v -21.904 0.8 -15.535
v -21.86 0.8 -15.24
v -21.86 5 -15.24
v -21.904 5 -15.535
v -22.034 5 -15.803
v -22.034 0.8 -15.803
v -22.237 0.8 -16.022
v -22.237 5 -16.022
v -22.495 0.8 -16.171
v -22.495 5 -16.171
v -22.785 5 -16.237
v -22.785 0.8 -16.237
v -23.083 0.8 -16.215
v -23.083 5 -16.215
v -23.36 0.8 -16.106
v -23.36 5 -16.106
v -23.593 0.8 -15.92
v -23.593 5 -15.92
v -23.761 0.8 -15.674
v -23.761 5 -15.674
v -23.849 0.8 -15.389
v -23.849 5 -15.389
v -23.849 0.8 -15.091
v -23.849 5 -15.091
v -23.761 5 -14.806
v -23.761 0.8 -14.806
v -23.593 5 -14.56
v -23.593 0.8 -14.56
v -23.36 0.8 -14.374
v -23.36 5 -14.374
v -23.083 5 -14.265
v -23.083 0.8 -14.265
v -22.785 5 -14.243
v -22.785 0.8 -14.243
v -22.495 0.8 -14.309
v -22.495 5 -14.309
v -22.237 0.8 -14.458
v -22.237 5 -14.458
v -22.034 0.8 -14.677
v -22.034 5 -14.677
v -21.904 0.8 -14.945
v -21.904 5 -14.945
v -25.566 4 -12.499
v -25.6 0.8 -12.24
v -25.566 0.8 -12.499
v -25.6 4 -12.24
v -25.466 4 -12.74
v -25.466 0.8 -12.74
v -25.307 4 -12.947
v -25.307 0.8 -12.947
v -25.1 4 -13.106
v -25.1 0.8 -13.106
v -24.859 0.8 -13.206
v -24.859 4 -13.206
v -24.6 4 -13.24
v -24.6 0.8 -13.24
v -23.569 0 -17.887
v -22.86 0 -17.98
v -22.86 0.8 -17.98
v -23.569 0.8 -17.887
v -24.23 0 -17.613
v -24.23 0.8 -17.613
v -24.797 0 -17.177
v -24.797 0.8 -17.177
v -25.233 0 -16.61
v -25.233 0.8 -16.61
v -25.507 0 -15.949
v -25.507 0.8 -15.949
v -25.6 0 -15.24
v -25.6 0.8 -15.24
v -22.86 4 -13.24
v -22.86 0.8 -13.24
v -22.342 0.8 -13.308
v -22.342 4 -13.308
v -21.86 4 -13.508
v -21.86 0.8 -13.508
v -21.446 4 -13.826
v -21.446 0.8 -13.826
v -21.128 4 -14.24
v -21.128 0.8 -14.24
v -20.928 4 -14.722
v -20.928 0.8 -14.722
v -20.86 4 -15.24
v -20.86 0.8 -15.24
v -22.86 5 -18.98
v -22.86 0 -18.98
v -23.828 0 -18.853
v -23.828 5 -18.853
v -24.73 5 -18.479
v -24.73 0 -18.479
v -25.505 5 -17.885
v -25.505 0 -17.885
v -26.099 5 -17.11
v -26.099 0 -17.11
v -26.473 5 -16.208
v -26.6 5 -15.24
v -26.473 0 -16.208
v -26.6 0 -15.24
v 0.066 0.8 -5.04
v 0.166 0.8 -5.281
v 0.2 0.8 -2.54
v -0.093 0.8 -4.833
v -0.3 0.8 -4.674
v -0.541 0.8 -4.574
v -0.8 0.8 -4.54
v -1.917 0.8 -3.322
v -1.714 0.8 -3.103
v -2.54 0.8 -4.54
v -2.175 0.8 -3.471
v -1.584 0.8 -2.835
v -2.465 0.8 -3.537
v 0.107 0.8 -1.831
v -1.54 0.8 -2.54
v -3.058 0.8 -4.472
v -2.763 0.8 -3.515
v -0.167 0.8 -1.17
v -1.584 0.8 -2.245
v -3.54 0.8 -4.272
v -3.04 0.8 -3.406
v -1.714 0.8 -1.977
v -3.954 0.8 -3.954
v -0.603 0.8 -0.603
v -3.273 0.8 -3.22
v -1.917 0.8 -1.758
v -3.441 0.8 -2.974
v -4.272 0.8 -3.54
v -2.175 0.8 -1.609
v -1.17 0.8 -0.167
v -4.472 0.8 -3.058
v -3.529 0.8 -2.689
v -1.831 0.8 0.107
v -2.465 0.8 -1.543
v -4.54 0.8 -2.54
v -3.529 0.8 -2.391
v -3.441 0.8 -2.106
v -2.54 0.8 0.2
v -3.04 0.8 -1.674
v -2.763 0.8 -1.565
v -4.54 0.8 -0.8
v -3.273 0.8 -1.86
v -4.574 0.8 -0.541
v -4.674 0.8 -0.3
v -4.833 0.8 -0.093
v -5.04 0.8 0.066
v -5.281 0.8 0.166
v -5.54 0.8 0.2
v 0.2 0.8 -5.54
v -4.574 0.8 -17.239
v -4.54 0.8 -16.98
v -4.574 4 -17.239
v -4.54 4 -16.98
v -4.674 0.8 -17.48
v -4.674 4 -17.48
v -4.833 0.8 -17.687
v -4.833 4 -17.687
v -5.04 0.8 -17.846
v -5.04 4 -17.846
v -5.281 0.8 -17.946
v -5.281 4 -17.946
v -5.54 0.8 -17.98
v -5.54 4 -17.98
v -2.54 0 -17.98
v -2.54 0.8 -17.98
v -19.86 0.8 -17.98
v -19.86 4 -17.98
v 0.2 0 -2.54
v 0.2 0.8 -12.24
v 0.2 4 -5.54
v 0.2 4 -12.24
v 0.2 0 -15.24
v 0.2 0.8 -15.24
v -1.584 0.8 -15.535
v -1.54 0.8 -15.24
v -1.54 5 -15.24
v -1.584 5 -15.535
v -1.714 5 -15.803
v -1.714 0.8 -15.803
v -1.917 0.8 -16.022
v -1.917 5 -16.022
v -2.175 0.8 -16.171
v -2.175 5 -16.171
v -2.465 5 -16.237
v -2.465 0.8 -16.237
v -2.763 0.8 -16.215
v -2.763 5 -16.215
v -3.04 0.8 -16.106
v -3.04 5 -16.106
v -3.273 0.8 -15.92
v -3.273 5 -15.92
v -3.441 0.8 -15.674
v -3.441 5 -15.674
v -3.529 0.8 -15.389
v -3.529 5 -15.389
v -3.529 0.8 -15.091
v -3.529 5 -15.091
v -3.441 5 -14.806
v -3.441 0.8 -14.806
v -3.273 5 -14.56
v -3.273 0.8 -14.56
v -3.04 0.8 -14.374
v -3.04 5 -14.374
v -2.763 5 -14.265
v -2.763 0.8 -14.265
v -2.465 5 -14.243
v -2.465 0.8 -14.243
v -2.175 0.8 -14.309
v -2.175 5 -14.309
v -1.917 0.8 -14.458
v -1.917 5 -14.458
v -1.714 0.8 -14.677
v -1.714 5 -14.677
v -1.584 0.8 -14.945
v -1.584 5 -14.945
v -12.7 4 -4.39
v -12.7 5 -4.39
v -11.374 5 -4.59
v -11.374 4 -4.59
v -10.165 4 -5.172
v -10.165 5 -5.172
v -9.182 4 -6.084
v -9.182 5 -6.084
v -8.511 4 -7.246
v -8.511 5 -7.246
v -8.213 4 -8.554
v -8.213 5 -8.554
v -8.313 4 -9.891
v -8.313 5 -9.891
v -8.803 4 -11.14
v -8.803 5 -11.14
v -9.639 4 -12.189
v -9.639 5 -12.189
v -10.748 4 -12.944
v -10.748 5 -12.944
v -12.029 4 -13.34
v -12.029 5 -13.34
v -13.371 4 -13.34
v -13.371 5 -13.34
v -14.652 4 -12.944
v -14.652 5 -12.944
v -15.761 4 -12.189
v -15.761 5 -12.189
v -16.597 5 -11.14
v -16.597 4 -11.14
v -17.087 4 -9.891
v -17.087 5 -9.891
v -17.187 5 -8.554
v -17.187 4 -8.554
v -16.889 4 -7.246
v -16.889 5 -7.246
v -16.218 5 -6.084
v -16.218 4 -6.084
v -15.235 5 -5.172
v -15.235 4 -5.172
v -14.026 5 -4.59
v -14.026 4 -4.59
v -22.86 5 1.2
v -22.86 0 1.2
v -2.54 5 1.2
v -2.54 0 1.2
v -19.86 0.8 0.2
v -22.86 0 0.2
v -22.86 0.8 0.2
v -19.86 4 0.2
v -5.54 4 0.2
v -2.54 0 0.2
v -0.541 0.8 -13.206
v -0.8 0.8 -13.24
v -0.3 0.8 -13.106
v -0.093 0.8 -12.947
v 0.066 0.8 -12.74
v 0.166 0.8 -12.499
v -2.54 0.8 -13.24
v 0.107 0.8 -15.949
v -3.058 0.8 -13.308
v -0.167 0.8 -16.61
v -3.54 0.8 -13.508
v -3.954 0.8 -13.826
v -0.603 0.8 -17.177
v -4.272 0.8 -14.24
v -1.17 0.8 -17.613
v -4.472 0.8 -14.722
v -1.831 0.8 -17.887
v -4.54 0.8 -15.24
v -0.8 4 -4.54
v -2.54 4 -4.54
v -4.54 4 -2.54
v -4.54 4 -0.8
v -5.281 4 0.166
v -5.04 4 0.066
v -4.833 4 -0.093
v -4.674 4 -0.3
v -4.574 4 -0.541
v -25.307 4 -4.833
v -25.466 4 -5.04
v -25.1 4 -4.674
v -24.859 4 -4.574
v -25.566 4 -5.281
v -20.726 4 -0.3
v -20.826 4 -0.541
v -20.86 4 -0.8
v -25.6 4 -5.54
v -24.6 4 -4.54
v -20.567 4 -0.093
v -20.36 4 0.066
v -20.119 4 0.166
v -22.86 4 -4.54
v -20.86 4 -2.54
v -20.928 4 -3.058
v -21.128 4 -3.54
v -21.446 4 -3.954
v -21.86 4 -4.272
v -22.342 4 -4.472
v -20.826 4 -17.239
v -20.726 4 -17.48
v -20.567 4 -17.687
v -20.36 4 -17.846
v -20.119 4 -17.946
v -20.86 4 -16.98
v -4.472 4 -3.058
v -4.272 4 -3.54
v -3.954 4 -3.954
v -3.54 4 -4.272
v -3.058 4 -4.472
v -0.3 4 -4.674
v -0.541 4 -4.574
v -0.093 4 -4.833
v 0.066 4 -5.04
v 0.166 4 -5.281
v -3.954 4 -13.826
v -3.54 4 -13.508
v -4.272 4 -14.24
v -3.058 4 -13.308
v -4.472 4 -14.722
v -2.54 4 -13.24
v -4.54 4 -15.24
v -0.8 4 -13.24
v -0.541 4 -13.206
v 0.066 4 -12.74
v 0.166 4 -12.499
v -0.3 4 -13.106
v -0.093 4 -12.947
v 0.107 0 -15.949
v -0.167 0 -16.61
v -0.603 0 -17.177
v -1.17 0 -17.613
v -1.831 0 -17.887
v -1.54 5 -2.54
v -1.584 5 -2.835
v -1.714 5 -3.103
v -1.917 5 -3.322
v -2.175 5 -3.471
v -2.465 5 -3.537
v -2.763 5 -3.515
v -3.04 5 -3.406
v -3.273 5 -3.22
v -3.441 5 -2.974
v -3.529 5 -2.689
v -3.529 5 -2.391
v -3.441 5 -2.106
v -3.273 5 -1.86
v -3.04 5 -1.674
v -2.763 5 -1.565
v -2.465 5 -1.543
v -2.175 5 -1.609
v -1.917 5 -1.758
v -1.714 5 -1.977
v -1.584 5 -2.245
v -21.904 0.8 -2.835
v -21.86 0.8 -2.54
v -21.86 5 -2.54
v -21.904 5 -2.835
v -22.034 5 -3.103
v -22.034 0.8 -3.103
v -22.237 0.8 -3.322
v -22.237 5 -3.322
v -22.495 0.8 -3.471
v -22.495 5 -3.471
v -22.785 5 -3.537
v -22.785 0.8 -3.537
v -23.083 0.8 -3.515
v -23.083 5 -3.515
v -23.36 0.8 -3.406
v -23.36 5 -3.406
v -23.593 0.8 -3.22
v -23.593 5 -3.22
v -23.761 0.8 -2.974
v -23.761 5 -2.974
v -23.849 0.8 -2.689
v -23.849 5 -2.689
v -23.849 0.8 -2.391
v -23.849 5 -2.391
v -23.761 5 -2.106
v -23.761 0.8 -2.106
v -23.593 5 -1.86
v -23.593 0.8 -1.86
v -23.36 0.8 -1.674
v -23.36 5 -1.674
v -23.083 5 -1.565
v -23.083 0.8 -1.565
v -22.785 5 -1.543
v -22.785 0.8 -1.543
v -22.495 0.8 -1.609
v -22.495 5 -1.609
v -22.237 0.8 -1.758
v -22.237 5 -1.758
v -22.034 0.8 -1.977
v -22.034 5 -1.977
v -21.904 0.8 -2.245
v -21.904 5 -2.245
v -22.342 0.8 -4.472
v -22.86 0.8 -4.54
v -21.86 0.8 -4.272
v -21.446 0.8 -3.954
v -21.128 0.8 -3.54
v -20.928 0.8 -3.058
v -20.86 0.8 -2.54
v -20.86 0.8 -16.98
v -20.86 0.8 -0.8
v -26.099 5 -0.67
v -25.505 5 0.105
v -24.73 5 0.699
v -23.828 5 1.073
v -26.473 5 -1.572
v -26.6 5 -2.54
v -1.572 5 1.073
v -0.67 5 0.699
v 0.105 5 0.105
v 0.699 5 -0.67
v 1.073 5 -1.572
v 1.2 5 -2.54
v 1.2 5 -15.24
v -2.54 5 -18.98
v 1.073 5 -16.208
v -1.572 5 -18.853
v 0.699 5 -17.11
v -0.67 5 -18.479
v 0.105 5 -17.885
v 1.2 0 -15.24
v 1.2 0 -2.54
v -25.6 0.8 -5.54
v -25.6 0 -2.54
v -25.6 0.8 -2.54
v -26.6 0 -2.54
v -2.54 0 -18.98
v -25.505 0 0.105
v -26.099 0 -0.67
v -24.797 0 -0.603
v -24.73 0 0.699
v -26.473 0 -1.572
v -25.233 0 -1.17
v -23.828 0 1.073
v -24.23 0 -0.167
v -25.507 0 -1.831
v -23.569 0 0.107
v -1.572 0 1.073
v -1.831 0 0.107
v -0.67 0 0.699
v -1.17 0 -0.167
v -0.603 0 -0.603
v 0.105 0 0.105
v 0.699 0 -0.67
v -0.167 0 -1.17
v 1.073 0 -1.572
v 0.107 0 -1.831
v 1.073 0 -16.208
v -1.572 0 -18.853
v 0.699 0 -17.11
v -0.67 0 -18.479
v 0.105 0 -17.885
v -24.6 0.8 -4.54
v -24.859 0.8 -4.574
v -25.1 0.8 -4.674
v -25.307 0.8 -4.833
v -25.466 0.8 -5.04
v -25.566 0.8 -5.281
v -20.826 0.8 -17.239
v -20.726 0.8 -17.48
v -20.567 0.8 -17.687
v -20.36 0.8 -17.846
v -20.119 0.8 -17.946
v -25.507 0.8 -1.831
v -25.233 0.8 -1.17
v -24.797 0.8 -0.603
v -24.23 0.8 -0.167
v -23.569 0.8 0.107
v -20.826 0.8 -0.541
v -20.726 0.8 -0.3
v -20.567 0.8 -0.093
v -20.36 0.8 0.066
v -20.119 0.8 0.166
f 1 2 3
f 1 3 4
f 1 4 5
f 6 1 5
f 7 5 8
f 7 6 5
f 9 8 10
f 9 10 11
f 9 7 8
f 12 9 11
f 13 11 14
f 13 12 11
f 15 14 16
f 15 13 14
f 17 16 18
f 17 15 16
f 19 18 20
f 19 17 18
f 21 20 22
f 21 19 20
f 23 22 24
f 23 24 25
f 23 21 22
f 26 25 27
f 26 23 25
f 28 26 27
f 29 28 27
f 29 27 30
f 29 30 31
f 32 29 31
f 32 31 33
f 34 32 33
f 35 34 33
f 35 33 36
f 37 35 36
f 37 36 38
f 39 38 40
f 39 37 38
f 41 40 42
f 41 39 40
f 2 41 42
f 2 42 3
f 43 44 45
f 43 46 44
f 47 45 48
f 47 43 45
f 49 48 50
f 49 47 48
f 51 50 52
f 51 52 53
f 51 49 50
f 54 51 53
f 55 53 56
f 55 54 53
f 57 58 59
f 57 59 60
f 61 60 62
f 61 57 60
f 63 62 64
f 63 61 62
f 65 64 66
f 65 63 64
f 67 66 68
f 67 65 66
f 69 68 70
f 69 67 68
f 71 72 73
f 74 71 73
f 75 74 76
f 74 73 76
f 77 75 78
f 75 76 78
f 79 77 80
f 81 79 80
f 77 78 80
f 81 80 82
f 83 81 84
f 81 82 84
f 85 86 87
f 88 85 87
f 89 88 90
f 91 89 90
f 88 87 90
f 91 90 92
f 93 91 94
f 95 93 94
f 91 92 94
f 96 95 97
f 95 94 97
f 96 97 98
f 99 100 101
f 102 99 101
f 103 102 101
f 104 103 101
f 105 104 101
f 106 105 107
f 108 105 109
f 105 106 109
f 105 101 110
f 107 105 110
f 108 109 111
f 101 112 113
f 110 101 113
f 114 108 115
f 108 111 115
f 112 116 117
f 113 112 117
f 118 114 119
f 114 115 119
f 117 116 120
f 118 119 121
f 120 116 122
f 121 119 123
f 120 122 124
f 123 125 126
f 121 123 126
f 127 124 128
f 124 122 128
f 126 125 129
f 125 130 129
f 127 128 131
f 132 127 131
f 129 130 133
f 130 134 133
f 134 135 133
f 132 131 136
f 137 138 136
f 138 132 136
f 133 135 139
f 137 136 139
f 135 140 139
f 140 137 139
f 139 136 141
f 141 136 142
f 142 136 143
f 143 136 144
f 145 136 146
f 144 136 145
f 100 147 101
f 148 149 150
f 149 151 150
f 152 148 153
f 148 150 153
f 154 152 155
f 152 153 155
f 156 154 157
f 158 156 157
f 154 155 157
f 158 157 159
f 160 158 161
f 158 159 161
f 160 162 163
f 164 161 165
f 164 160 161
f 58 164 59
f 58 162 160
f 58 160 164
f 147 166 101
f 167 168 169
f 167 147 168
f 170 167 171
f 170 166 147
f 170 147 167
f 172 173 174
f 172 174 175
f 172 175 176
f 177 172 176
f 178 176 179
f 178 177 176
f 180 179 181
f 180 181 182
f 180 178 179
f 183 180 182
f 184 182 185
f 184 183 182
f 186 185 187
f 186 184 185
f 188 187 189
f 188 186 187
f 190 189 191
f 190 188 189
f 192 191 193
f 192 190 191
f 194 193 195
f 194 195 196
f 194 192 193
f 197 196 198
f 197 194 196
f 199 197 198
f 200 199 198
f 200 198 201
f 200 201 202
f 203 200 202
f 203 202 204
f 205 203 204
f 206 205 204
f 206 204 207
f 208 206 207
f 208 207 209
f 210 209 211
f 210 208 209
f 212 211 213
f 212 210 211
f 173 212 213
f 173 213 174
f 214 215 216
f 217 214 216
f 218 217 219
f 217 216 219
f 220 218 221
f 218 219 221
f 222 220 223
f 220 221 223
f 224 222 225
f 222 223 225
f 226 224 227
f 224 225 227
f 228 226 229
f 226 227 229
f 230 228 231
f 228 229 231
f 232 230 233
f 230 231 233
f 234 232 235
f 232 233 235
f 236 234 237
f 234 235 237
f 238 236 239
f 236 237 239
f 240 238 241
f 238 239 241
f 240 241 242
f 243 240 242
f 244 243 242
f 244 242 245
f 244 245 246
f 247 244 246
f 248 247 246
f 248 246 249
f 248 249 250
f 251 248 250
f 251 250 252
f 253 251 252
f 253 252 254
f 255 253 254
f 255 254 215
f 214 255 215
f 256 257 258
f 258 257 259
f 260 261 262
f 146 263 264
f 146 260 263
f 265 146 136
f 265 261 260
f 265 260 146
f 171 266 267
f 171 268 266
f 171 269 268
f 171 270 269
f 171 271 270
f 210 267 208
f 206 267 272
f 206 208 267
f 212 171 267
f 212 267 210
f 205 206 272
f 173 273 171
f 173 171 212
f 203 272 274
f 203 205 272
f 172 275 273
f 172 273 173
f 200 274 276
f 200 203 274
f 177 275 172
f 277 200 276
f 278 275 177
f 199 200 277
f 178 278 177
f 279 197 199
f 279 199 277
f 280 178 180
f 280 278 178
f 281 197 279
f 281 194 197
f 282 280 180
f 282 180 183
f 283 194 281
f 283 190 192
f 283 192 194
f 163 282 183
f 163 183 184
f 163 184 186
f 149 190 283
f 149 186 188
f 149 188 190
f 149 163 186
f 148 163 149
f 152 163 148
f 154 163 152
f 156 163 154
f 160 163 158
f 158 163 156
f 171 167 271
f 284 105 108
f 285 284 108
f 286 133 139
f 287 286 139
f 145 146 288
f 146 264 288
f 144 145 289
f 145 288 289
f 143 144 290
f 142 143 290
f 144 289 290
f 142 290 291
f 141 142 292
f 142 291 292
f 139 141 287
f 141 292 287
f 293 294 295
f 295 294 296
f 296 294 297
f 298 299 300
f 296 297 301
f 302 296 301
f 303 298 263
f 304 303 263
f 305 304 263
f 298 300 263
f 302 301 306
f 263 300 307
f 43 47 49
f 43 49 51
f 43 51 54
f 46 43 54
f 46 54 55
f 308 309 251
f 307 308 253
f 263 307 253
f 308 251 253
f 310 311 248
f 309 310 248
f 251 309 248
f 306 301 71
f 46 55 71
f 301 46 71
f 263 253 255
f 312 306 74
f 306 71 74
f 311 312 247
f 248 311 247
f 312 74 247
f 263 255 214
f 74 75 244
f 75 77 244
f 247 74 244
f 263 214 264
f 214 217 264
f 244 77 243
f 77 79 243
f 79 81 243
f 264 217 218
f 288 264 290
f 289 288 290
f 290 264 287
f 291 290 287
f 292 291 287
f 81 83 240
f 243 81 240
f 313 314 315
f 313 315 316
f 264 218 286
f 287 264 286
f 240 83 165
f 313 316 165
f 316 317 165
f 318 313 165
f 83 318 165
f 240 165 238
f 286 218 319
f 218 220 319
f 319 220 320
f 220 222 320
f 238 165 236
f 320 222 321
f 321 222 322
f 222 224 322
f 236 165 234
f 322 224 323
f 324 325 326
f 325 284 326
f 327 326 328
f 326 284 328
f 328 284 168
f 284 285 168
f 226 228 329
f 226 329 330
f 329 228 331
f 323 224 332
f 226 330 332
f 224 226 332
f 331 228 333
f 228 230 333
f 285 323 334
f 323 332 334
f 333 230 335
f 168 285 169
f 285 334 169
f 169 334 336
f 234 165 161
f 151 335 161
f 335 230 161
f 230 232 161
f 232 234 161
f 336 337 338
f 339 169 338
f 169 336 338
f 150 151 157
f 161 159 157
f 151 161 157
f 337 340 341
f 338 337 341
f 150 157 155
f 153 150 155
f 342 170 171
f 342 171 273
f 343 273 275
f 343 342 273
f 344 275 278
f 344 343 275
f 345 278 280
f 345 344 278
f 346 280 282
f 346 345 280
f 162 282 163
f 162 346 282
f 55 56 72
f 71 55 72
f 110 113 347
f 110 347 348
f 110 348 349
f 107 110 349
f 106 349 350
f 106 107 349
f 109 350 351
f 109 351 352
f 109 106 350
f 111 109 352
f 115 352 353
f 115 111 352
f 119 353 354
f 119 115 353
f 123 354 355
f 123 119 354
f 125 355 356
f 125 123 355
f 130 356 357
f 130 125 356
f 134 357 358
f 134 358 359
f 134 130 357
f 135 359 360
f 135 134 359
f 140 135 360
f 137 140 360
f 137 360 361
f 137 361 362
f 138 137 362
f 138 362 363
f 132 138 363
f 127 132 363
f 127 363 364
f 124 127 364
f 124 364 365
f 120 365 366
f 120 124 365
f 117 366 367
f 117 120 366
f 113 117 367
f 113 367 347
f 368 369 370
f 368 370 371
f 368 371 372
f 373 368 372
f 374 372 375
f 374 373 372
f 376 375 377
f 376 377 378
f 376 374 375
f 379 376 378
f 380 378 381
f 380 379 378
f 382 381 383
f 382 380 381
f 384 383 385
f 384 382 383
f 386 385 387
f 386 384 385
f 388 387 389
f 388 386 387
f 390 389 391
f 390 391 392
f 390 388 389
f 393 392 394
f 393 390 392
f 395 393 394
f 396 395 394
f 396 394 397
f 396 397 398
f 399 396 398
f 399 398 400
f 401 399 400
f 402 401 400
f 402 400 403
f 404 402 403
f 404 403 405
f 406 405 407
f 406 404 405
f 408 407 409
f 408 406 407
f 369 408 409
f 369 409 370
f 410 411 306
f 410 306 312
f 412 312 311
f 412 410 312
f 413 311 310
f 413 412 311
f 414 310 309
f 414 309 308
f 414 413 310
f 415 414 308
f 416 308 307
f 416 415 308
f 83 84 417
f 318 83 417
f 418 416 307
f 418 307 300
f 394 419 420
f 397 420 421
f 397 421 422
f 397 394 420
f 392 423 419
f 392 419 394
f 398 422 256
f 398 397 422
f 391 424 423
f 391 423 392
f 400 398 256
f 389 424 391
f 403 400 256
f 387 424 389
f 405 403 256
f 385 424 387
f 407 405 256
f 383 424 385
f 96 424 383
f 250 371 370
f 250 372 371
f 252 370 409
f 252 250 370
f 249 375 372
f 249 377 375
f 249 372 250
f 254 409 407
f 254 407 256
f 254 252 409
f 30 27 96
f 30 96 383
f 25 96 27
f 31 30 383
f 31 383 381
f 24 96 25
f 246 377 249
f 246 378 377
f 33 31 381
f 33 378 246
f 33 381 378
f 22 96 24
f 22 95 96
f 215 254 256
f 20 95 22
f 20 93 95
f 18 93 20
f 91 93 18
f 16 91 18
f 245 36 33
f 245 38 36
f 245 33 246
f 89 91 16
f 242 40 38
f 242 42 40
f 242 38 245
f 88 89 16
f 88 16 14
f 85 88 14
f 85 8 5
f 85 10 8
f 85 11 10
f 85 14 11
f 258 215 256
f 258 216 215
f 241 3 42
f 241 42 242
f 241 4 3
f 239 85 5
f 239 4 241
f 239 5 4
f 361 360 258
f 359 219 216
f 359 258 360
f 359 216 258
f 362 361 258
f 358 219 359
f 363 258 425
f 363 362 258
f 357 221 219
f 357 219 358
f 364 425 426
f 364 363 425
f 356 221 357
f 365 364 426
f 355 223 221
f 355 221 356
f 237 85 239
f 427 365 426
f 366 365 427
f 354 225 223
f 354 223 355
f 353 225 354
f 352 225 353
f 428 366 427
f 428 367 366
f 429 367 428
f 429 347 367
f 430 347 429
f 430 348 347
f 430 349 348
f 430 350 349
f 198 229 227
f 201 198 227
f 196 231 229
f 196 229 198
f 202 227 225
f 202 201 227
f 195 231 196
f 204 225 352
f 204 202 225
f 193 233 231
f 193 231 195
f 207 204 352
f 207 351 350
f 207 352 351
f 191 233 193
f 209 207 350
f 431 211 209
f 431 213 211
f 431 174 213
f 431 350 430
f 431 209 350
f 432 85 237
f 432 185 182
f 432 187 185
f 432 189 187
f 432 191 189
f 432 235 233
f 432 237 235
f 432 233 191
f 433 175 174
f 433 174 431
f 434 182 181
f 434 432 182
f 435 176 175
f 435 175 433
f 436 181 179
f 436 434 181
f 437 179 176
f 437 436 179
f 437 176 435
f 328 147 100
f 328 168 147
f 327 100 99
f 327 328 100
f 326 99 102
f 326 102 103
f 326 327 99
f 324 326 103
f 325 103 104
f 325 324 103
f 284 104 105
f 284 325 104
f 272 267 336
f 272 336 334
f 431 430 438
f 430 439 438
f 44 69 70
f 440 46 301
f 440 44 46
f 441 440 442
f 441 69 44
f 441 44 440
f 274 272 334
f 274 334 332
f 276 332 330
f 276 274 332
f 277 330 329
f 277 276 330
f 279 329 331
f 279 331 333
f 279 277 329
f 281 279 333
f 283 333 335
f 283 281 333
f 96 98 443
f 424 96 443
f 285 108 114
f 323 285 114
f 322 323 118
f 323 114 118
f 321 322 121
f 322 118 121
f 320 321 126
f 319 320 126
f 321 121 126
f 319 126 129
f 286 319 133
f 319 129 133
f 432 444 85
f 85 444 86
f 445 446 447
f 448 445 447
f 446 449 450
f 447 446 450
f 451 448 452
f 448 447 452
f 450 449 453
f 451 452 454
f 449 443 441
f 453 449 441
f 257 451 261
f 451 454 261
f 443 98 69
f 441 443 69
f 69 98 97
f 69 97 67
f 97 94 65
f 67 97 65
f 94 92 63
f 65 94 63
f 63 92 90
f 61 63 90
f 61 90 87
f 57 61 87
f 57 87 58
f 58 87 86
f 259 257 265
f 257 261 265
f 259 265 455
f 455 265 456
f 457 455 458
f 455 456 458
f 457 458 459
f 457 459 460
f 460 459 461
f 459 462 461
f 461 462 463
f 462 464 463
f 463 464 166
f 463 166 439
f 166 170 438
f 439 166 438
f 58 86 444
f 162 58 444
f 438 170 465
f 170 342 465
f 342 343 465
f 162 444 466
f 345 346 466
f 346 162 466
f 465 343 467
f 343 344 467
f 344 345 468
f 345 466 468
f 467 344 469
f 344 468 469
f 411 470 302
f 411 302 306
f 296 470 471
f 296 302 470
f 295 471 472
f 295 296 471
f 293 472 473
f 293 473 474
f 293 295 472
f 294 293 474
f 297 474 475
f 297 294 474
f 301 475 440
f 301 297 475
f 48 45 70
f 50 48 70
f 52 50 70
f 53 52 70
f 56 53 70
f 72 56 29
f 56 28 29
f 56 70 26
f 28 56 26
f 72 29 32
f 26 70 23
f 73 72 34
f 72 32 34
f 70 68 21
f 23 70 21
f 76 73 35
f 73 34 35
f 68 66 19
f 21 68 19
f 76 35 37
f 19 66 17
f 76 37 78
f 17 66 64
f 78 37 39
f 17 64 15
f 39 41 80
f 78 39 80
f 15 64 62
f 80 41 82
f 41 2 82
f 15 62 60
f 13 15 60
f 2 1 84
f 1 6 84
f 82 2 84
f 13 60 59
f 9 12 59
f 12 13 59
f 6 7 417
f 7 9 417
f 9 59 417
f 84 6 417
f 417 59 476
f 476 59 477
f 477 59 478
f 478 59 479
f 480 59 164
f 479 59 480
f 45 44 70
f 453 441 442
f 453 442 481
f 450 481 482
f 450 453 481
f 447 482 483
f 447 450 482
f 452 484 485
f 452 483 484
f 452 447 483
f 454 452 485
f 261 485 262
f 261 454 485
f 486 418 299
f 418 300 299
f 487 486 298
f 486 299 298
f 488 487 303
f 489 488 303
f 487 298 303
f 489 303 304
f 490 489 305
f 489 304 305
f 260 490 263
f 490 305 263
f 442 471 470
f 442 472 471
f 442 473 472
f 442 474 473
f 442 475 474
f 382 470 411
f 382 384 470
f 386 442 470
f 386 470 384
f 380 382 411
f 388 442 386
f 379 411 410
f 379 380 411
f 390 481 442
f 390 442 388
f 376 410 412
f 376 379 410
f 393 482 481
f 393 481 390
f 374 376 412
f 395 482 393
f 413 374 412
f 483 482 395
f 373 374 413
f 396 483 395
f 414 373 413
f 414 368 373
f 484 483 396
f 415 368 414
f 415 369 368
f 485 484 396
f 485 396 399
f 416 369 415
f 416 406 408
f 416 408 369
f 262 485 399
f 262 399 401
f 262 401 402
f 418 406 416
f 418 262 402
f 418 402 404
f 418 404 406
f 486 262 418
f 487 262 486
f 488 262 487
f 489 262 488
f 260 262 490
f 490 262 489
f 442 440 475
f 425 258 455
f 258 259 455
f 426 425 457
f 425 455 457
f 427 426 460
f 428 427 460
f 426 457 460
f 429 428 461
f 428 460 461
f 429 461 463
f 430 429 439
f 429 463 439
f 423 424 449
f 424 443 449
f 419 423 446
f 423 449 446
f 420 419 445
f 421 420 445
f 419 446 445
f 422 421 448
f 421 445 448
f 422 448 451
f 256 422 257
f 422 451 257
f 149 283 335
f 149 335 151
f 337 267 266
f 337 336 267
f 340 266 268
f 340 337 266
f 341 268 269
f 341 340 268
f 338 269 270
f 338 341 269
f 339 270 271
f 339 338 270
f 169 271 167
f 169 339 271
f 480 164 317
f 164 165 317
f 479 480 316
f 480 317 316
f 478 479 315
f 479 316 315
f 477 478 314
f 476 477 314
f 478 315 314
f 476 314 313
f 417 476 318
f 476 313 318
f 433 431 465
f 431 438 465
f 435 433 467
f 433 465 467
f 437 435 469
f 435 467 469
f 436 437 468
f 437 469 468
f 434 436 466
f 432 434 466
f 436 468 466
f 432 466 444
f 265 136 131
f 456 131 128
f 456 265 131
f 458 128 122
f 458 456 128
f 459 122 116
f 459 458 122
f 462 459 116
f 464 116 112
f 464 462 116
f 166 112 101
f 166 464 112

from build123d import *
from build123d.topology import SkipClean

# Parameters (mm, degrees)
BOSS_EXTRUDE1_DEPTH       = 4
BOSS_EXTRUDE2_DEPTH       = 1
BOSS_EXTRUDE3_START       = -0.8
SKETCH4_R                 = 2
SKETCH4_R_2               = 1.25
BOSS_EXTRUDE3_DEPTH       = 3.2
MIRROR4_START             = -0.8
MIRROR4_COPY_1_SKETCH_R   = 2
MIRROR4_COPY_1_SKETCH_R_2 = 1.25
MIRROR4_COPY_1_DEPTH      = 3.2
SKETCH5_R                 = 4.5
CUT_EXTRUDE1_DEPTH        = 3
SKETCH1_R                 = 1.25
CUT_EXTRUDE2_DEPTH        = 10
FILLET2_R                 = 1
EXTRUDE_THIN1_START       = -4.2
SKETCH6_R                 = 2
SKETCH6_R_2               = 1
EXTRUDE_THIN1_DEPTH       = 4.2


with BuildPart() as part:
    # Sketch2 → Boss-Extrude1 (new body)
    with BuildSketch(Plane(origin=(0, 0, 0), x_dir=(1, 0, 0), z_dir=(0, 1, 0))):
        with BuildLine():
            Line((-26.6, 15.24), (-26.6, 2.54))
            ThreePointArc((-26.6, 2.54), (-25.504579362, -0.104579362), (-22.86, -1.2))
            Line((-22.86, -1.2), (-2.54, -1.2))
            ThreePointArc((-2.54, -1.2), (0.104579362, -0.104579362), (1.2, 2.54))
            Line((1.2, 2.54), (1.2, 15.24))
            ThreePointArc((1.2, 15.24), (0.104579362, 17.884579362), (-2.54, 18.98))
            Line((-2.54, 18.98), (-22.86, 18.98))
            ThreePointArc((-22.86, 18.98), (-25.504579362, 17.884579362), (-26.6, 15.24))
        make_face()
        with BuildLine():
            Line((0.2, 2.54), (0.2, 15.24))
            ThreePointArc((0.2, 15.24), (-0.60252742, 17.17747258), (-2.54, 17.98))
            Line((-2.54, 17.98), (-22.86, 17.98))
            ThreePointArc((-22.86, 17.98), (-24.79747258, 17.17747258), (-25.6, 15.24))
            Line((-25.6, 15.24), (-25.6, 2.54))
            ThreePointArc((-25.6, 2.54), (-24.79747258, 0.60252742), (-22.86, -0.2))
            Line((-22.86, -0.2), (-2.54, -0.2))
            ThreePointArc((-2.54, -0.2), (-0.60252742, 0.60252742), (0.2, 2.54))
        make_face(mode=Mode.SUBTRACT)
    extrude(amount=BOSS_EXTRUDE1_DEPTH)

    # Sketch3 → Boss-Extrude2 (add)
    with BuildSketch(Plane(origin=(0, 4, 0), x_dir=(1, 0, 0), z_dir=(0, 1, 0))):
        with BuildLine():
            Line((-26.6, 15.24), (-26.6, 2.54))
            ThreePointArc((-26.6, 2.54), (-25.504579362, -0.104579362), (-22.86, -1.2))
            Line((-22.86, -1.2), (-2.54, -1.2))
            ThreePointArc((-2.54, -1.2), (0.104579362, -0.104579362), (1.2, 2.54))
            Line((1.2, 2.54), (1.2, 15.24))
            ThreePointArc((1.2, 15.24), (0.104579362, 17.884579362), (-2.54, 18.98))
            Line((-2.54, 18.98), (-22.86, 18.98))
            ThreePointArc((-22.86, 18.98), (-25.504579362, 17.884579362), (-26.6, 15.24))
        make_face()
    extrude(amount=BOSS_EXTRUDE2_DEPTH)

    # Sketch4 → Boss-Extrude3 (add)
    # profile 1 of 2: a face of its own
    with BuildSketch(Plane.XZ.offset(BOSS_EXTRUDE3_START)):
        with BuildLine():
            ThreePointArc((-22.86, -4.54), (-24.274213562, -1.125786438), (-20.86, -2.54))
            Line((-20.86, -2.54), (-20.86, 0.2))
            Line((-20.86, 0.2), (-22.86, 0.2))
            ThreePointArc((-22.86, 0.2), (-24.79747258, -0.60252742), (-25.6, -2.54))
            Line((-25.6, -2.54), (-25.6, -4.54))
            Line((-25.6, -4.54), (-22.86, -4.54))
        make_face()
    # profile 2 of 2: a face of its own
    with BuildSketch(Plane.XZ.offset(BOSS_EXTRUDE3_START)):
        with Locations((-22.86, -2.54)):
            Circle(SKETCH4_R)
        with Locations(Location((-22.86, -2.54, 0), (0, 0, 90))):
            Circle(SKETCH4_R_2, mode=Mode.SUBTRACT)
    boss_extrude3 = extrude(amount=-BOSS_EXTRUDE3_DEPTH)

    # Mirror3: Boss-Extrude3 across plane
    add(boss_extrude3.mirror(Plane.ZY.offset(12.7)))

    # Mirror4: Boss-Extrude3 across plane
    add(boss_extrude3.mirror(Plane(origin=(0, 0, -8.89), x_dir=(1, 0, 0), z_dir=(0, 0, -1))))

    # Mirror4 copy 1 sketch → Mirror4 copy 1 (add)
    # profile 1 of 2: a face of its own
    with BuildSketch(Plane(origin=(-25.4, 0, -17.78), x_dir=(-1, 0, 0), z_dir=(0, -1, 0)).offset(MIRROR4_START)):
        with BuildLine():
            ThreePointArc((-22.86, -4.54), (-24.274213562, -1.125786438), (-20.86, -2.54))
            Line((-20.86, -2.54), (-20.86, 0.2))
            Line((-20.86, 0.2), (-22.86, 0.2))
            ThreePointArc((-22.86, 0.2), (-24.79747258, -0.60252742), (-25.6, -2.54))
            Line((-25.6, -2.54), (-25.6, -4.54))
            Line((-25.6, -4.54), (-22.86, -4.54))
        make_face()
    # profile 2 of 2: a face of its own
    with BuildSketch(Plane(origin=(-25.4, 0, -17.78), x_dir=(-1, 0, 0), z_dir=(0, -1, 0)).offset(MIRROR4_START)):
        with Locations((-22.86, -2.54)):
            Circle(MIRROR4_COPY_1_SKETCH_R)
        with Locations(Location((-22.86, -2.54, 0), (0, 0, 90))):
            Circle(MIRROR4_COPY_1_SKETCH_R_2, mode=Mode.SUBTRACT)
    extrude(amount=-MIRROR4_COPY_1_DEPTH)

    # Sketch5 → Cut-Extrude1 (cut)
    with BuildSketch(Plane(origin=(0, 5, 0), x_dir=(1, 0, 0), z_dir=(0, 1, 0))):
        with Locations(Location((-12.7, 8.89, 0), (0, 0, 270))):
            Circle(SKETCH5_R)
    extrude(amount=-CUT_EXTRUDE1_DEPTH, mode=Mode.SUBTRACT)

    # Sketch1 → Cut-Extrude2 (cut)
    with SkipClean():  # the faces are left unmerged after this step: merging them gives an invalid solid
        with BuildSketch(Plane(origin=(0, 0, 0), x_dir=(1, 0, 0), z_dir=(0, 1, 0))):
            with Locations(Location((-22.86, 2.54, 0), (0, 0, 270))):
                Circle(SKETCH1_R)
            with Locations(Location((-2.54, 2.54, 0), (0, 0, 270))):
                Circle(SKETCH1_R)
            with Locations(Location((-2.54, 15.24, 0), (0, 0, 270))):
                Circle(SKETCH1_R)
            with Locations(Location((-22.86, 15.24, 0), (0, 0, 270))):
                Circle(SKETCH1_R)
        extrude(amount=CUT_EXTRUDE2_DEPTH, mode=Mode.SUBTRACT)
    add(part.part.scale(1), mode=Mode.REPLACE)  # the faces are merged on a copy

    # Fillet2
    fillet2_edges = [part.edges().sort_by_distance(p)[0] for p in [
        (-4.54, 2.4, 0.2),
        (0.2, 2.4, -4.54),
        (0.2, 2.4, -13.24),
        (-4.54, 2.4, -17.98),
        (-20.86, 2.4, -17.98),
        (-25.6, 2.4, -13.24),
        (-25.6, 2.4, -4.54),
        (-20.86, 2.4, 0.2),
    ]]
    fillet(fillet2_edges, radius=FILLET2_R)

    # Sketch6 → Extrude-Thin1 (add)
    # profile 1 of 4: a face of its own
    with BuildSketch(Plane(origin=(0, 5, 0), x_dir=(1, 0, 0), z_dir=(0, 1, 0)).offset(EXTRUDE_THIN1_START)):
        with Locations((-2.54, 15.24)):
            Circle(SKETCH6_R)
        with Locations((-2.54, 15.24)):
            Circle(SKETCH6_R_2, mode=Mode.SUBTRACT)
    # profile 2 of 4: a face of its own
    with BuildSketch(Plane(origin=(0, 5, 0), x_dir=(1, 0, 0), z_dir=(0, 1, 0)).offset(EXTRUDE_THIN1_START)):
        with Locations((-22.86, 15.24)):
            Circle(SKETCH6_R)
        with Locations((-22.86, 15.24)):
            Circle(SKETCH6_R_2, mode=Mode.SUBTRACT)
    # profile 3 of 4: a face of its own
    with BuildSketch(Plane(origin=(0, 5, 0), x_dir=(1, 0, 0), z_dir=(0, 1, 0)).offset(EXTRUDE_THIN1_START)):
        with Locations((-2.54, 2.54)):
            Circle(SKETCH6_R)
        with Locations((-2.54, 2.54)):
            Circle(SKETCH6_R_2, mode=Mode.SUBTRACT)
    # profile 4 of 4: a face of its own
    with BuildSketch(Plane(origin=(0, 5, 0), x_dir=(1, 0, 0), z_dir=(0, 1, 0)).offset(EXTRUDE_THIN1_START)):
        with Locations((-22.86, 2.54)):
            Circle(SKETCH6_R)
        with Locations((-22.86, 2.54)):
            Circle(SKETCH6_R_2, mode=Mode.SUBTRACT)
    extrude(amount=EXTRUDE_THIN1_DEPTH)


solid = part.part
